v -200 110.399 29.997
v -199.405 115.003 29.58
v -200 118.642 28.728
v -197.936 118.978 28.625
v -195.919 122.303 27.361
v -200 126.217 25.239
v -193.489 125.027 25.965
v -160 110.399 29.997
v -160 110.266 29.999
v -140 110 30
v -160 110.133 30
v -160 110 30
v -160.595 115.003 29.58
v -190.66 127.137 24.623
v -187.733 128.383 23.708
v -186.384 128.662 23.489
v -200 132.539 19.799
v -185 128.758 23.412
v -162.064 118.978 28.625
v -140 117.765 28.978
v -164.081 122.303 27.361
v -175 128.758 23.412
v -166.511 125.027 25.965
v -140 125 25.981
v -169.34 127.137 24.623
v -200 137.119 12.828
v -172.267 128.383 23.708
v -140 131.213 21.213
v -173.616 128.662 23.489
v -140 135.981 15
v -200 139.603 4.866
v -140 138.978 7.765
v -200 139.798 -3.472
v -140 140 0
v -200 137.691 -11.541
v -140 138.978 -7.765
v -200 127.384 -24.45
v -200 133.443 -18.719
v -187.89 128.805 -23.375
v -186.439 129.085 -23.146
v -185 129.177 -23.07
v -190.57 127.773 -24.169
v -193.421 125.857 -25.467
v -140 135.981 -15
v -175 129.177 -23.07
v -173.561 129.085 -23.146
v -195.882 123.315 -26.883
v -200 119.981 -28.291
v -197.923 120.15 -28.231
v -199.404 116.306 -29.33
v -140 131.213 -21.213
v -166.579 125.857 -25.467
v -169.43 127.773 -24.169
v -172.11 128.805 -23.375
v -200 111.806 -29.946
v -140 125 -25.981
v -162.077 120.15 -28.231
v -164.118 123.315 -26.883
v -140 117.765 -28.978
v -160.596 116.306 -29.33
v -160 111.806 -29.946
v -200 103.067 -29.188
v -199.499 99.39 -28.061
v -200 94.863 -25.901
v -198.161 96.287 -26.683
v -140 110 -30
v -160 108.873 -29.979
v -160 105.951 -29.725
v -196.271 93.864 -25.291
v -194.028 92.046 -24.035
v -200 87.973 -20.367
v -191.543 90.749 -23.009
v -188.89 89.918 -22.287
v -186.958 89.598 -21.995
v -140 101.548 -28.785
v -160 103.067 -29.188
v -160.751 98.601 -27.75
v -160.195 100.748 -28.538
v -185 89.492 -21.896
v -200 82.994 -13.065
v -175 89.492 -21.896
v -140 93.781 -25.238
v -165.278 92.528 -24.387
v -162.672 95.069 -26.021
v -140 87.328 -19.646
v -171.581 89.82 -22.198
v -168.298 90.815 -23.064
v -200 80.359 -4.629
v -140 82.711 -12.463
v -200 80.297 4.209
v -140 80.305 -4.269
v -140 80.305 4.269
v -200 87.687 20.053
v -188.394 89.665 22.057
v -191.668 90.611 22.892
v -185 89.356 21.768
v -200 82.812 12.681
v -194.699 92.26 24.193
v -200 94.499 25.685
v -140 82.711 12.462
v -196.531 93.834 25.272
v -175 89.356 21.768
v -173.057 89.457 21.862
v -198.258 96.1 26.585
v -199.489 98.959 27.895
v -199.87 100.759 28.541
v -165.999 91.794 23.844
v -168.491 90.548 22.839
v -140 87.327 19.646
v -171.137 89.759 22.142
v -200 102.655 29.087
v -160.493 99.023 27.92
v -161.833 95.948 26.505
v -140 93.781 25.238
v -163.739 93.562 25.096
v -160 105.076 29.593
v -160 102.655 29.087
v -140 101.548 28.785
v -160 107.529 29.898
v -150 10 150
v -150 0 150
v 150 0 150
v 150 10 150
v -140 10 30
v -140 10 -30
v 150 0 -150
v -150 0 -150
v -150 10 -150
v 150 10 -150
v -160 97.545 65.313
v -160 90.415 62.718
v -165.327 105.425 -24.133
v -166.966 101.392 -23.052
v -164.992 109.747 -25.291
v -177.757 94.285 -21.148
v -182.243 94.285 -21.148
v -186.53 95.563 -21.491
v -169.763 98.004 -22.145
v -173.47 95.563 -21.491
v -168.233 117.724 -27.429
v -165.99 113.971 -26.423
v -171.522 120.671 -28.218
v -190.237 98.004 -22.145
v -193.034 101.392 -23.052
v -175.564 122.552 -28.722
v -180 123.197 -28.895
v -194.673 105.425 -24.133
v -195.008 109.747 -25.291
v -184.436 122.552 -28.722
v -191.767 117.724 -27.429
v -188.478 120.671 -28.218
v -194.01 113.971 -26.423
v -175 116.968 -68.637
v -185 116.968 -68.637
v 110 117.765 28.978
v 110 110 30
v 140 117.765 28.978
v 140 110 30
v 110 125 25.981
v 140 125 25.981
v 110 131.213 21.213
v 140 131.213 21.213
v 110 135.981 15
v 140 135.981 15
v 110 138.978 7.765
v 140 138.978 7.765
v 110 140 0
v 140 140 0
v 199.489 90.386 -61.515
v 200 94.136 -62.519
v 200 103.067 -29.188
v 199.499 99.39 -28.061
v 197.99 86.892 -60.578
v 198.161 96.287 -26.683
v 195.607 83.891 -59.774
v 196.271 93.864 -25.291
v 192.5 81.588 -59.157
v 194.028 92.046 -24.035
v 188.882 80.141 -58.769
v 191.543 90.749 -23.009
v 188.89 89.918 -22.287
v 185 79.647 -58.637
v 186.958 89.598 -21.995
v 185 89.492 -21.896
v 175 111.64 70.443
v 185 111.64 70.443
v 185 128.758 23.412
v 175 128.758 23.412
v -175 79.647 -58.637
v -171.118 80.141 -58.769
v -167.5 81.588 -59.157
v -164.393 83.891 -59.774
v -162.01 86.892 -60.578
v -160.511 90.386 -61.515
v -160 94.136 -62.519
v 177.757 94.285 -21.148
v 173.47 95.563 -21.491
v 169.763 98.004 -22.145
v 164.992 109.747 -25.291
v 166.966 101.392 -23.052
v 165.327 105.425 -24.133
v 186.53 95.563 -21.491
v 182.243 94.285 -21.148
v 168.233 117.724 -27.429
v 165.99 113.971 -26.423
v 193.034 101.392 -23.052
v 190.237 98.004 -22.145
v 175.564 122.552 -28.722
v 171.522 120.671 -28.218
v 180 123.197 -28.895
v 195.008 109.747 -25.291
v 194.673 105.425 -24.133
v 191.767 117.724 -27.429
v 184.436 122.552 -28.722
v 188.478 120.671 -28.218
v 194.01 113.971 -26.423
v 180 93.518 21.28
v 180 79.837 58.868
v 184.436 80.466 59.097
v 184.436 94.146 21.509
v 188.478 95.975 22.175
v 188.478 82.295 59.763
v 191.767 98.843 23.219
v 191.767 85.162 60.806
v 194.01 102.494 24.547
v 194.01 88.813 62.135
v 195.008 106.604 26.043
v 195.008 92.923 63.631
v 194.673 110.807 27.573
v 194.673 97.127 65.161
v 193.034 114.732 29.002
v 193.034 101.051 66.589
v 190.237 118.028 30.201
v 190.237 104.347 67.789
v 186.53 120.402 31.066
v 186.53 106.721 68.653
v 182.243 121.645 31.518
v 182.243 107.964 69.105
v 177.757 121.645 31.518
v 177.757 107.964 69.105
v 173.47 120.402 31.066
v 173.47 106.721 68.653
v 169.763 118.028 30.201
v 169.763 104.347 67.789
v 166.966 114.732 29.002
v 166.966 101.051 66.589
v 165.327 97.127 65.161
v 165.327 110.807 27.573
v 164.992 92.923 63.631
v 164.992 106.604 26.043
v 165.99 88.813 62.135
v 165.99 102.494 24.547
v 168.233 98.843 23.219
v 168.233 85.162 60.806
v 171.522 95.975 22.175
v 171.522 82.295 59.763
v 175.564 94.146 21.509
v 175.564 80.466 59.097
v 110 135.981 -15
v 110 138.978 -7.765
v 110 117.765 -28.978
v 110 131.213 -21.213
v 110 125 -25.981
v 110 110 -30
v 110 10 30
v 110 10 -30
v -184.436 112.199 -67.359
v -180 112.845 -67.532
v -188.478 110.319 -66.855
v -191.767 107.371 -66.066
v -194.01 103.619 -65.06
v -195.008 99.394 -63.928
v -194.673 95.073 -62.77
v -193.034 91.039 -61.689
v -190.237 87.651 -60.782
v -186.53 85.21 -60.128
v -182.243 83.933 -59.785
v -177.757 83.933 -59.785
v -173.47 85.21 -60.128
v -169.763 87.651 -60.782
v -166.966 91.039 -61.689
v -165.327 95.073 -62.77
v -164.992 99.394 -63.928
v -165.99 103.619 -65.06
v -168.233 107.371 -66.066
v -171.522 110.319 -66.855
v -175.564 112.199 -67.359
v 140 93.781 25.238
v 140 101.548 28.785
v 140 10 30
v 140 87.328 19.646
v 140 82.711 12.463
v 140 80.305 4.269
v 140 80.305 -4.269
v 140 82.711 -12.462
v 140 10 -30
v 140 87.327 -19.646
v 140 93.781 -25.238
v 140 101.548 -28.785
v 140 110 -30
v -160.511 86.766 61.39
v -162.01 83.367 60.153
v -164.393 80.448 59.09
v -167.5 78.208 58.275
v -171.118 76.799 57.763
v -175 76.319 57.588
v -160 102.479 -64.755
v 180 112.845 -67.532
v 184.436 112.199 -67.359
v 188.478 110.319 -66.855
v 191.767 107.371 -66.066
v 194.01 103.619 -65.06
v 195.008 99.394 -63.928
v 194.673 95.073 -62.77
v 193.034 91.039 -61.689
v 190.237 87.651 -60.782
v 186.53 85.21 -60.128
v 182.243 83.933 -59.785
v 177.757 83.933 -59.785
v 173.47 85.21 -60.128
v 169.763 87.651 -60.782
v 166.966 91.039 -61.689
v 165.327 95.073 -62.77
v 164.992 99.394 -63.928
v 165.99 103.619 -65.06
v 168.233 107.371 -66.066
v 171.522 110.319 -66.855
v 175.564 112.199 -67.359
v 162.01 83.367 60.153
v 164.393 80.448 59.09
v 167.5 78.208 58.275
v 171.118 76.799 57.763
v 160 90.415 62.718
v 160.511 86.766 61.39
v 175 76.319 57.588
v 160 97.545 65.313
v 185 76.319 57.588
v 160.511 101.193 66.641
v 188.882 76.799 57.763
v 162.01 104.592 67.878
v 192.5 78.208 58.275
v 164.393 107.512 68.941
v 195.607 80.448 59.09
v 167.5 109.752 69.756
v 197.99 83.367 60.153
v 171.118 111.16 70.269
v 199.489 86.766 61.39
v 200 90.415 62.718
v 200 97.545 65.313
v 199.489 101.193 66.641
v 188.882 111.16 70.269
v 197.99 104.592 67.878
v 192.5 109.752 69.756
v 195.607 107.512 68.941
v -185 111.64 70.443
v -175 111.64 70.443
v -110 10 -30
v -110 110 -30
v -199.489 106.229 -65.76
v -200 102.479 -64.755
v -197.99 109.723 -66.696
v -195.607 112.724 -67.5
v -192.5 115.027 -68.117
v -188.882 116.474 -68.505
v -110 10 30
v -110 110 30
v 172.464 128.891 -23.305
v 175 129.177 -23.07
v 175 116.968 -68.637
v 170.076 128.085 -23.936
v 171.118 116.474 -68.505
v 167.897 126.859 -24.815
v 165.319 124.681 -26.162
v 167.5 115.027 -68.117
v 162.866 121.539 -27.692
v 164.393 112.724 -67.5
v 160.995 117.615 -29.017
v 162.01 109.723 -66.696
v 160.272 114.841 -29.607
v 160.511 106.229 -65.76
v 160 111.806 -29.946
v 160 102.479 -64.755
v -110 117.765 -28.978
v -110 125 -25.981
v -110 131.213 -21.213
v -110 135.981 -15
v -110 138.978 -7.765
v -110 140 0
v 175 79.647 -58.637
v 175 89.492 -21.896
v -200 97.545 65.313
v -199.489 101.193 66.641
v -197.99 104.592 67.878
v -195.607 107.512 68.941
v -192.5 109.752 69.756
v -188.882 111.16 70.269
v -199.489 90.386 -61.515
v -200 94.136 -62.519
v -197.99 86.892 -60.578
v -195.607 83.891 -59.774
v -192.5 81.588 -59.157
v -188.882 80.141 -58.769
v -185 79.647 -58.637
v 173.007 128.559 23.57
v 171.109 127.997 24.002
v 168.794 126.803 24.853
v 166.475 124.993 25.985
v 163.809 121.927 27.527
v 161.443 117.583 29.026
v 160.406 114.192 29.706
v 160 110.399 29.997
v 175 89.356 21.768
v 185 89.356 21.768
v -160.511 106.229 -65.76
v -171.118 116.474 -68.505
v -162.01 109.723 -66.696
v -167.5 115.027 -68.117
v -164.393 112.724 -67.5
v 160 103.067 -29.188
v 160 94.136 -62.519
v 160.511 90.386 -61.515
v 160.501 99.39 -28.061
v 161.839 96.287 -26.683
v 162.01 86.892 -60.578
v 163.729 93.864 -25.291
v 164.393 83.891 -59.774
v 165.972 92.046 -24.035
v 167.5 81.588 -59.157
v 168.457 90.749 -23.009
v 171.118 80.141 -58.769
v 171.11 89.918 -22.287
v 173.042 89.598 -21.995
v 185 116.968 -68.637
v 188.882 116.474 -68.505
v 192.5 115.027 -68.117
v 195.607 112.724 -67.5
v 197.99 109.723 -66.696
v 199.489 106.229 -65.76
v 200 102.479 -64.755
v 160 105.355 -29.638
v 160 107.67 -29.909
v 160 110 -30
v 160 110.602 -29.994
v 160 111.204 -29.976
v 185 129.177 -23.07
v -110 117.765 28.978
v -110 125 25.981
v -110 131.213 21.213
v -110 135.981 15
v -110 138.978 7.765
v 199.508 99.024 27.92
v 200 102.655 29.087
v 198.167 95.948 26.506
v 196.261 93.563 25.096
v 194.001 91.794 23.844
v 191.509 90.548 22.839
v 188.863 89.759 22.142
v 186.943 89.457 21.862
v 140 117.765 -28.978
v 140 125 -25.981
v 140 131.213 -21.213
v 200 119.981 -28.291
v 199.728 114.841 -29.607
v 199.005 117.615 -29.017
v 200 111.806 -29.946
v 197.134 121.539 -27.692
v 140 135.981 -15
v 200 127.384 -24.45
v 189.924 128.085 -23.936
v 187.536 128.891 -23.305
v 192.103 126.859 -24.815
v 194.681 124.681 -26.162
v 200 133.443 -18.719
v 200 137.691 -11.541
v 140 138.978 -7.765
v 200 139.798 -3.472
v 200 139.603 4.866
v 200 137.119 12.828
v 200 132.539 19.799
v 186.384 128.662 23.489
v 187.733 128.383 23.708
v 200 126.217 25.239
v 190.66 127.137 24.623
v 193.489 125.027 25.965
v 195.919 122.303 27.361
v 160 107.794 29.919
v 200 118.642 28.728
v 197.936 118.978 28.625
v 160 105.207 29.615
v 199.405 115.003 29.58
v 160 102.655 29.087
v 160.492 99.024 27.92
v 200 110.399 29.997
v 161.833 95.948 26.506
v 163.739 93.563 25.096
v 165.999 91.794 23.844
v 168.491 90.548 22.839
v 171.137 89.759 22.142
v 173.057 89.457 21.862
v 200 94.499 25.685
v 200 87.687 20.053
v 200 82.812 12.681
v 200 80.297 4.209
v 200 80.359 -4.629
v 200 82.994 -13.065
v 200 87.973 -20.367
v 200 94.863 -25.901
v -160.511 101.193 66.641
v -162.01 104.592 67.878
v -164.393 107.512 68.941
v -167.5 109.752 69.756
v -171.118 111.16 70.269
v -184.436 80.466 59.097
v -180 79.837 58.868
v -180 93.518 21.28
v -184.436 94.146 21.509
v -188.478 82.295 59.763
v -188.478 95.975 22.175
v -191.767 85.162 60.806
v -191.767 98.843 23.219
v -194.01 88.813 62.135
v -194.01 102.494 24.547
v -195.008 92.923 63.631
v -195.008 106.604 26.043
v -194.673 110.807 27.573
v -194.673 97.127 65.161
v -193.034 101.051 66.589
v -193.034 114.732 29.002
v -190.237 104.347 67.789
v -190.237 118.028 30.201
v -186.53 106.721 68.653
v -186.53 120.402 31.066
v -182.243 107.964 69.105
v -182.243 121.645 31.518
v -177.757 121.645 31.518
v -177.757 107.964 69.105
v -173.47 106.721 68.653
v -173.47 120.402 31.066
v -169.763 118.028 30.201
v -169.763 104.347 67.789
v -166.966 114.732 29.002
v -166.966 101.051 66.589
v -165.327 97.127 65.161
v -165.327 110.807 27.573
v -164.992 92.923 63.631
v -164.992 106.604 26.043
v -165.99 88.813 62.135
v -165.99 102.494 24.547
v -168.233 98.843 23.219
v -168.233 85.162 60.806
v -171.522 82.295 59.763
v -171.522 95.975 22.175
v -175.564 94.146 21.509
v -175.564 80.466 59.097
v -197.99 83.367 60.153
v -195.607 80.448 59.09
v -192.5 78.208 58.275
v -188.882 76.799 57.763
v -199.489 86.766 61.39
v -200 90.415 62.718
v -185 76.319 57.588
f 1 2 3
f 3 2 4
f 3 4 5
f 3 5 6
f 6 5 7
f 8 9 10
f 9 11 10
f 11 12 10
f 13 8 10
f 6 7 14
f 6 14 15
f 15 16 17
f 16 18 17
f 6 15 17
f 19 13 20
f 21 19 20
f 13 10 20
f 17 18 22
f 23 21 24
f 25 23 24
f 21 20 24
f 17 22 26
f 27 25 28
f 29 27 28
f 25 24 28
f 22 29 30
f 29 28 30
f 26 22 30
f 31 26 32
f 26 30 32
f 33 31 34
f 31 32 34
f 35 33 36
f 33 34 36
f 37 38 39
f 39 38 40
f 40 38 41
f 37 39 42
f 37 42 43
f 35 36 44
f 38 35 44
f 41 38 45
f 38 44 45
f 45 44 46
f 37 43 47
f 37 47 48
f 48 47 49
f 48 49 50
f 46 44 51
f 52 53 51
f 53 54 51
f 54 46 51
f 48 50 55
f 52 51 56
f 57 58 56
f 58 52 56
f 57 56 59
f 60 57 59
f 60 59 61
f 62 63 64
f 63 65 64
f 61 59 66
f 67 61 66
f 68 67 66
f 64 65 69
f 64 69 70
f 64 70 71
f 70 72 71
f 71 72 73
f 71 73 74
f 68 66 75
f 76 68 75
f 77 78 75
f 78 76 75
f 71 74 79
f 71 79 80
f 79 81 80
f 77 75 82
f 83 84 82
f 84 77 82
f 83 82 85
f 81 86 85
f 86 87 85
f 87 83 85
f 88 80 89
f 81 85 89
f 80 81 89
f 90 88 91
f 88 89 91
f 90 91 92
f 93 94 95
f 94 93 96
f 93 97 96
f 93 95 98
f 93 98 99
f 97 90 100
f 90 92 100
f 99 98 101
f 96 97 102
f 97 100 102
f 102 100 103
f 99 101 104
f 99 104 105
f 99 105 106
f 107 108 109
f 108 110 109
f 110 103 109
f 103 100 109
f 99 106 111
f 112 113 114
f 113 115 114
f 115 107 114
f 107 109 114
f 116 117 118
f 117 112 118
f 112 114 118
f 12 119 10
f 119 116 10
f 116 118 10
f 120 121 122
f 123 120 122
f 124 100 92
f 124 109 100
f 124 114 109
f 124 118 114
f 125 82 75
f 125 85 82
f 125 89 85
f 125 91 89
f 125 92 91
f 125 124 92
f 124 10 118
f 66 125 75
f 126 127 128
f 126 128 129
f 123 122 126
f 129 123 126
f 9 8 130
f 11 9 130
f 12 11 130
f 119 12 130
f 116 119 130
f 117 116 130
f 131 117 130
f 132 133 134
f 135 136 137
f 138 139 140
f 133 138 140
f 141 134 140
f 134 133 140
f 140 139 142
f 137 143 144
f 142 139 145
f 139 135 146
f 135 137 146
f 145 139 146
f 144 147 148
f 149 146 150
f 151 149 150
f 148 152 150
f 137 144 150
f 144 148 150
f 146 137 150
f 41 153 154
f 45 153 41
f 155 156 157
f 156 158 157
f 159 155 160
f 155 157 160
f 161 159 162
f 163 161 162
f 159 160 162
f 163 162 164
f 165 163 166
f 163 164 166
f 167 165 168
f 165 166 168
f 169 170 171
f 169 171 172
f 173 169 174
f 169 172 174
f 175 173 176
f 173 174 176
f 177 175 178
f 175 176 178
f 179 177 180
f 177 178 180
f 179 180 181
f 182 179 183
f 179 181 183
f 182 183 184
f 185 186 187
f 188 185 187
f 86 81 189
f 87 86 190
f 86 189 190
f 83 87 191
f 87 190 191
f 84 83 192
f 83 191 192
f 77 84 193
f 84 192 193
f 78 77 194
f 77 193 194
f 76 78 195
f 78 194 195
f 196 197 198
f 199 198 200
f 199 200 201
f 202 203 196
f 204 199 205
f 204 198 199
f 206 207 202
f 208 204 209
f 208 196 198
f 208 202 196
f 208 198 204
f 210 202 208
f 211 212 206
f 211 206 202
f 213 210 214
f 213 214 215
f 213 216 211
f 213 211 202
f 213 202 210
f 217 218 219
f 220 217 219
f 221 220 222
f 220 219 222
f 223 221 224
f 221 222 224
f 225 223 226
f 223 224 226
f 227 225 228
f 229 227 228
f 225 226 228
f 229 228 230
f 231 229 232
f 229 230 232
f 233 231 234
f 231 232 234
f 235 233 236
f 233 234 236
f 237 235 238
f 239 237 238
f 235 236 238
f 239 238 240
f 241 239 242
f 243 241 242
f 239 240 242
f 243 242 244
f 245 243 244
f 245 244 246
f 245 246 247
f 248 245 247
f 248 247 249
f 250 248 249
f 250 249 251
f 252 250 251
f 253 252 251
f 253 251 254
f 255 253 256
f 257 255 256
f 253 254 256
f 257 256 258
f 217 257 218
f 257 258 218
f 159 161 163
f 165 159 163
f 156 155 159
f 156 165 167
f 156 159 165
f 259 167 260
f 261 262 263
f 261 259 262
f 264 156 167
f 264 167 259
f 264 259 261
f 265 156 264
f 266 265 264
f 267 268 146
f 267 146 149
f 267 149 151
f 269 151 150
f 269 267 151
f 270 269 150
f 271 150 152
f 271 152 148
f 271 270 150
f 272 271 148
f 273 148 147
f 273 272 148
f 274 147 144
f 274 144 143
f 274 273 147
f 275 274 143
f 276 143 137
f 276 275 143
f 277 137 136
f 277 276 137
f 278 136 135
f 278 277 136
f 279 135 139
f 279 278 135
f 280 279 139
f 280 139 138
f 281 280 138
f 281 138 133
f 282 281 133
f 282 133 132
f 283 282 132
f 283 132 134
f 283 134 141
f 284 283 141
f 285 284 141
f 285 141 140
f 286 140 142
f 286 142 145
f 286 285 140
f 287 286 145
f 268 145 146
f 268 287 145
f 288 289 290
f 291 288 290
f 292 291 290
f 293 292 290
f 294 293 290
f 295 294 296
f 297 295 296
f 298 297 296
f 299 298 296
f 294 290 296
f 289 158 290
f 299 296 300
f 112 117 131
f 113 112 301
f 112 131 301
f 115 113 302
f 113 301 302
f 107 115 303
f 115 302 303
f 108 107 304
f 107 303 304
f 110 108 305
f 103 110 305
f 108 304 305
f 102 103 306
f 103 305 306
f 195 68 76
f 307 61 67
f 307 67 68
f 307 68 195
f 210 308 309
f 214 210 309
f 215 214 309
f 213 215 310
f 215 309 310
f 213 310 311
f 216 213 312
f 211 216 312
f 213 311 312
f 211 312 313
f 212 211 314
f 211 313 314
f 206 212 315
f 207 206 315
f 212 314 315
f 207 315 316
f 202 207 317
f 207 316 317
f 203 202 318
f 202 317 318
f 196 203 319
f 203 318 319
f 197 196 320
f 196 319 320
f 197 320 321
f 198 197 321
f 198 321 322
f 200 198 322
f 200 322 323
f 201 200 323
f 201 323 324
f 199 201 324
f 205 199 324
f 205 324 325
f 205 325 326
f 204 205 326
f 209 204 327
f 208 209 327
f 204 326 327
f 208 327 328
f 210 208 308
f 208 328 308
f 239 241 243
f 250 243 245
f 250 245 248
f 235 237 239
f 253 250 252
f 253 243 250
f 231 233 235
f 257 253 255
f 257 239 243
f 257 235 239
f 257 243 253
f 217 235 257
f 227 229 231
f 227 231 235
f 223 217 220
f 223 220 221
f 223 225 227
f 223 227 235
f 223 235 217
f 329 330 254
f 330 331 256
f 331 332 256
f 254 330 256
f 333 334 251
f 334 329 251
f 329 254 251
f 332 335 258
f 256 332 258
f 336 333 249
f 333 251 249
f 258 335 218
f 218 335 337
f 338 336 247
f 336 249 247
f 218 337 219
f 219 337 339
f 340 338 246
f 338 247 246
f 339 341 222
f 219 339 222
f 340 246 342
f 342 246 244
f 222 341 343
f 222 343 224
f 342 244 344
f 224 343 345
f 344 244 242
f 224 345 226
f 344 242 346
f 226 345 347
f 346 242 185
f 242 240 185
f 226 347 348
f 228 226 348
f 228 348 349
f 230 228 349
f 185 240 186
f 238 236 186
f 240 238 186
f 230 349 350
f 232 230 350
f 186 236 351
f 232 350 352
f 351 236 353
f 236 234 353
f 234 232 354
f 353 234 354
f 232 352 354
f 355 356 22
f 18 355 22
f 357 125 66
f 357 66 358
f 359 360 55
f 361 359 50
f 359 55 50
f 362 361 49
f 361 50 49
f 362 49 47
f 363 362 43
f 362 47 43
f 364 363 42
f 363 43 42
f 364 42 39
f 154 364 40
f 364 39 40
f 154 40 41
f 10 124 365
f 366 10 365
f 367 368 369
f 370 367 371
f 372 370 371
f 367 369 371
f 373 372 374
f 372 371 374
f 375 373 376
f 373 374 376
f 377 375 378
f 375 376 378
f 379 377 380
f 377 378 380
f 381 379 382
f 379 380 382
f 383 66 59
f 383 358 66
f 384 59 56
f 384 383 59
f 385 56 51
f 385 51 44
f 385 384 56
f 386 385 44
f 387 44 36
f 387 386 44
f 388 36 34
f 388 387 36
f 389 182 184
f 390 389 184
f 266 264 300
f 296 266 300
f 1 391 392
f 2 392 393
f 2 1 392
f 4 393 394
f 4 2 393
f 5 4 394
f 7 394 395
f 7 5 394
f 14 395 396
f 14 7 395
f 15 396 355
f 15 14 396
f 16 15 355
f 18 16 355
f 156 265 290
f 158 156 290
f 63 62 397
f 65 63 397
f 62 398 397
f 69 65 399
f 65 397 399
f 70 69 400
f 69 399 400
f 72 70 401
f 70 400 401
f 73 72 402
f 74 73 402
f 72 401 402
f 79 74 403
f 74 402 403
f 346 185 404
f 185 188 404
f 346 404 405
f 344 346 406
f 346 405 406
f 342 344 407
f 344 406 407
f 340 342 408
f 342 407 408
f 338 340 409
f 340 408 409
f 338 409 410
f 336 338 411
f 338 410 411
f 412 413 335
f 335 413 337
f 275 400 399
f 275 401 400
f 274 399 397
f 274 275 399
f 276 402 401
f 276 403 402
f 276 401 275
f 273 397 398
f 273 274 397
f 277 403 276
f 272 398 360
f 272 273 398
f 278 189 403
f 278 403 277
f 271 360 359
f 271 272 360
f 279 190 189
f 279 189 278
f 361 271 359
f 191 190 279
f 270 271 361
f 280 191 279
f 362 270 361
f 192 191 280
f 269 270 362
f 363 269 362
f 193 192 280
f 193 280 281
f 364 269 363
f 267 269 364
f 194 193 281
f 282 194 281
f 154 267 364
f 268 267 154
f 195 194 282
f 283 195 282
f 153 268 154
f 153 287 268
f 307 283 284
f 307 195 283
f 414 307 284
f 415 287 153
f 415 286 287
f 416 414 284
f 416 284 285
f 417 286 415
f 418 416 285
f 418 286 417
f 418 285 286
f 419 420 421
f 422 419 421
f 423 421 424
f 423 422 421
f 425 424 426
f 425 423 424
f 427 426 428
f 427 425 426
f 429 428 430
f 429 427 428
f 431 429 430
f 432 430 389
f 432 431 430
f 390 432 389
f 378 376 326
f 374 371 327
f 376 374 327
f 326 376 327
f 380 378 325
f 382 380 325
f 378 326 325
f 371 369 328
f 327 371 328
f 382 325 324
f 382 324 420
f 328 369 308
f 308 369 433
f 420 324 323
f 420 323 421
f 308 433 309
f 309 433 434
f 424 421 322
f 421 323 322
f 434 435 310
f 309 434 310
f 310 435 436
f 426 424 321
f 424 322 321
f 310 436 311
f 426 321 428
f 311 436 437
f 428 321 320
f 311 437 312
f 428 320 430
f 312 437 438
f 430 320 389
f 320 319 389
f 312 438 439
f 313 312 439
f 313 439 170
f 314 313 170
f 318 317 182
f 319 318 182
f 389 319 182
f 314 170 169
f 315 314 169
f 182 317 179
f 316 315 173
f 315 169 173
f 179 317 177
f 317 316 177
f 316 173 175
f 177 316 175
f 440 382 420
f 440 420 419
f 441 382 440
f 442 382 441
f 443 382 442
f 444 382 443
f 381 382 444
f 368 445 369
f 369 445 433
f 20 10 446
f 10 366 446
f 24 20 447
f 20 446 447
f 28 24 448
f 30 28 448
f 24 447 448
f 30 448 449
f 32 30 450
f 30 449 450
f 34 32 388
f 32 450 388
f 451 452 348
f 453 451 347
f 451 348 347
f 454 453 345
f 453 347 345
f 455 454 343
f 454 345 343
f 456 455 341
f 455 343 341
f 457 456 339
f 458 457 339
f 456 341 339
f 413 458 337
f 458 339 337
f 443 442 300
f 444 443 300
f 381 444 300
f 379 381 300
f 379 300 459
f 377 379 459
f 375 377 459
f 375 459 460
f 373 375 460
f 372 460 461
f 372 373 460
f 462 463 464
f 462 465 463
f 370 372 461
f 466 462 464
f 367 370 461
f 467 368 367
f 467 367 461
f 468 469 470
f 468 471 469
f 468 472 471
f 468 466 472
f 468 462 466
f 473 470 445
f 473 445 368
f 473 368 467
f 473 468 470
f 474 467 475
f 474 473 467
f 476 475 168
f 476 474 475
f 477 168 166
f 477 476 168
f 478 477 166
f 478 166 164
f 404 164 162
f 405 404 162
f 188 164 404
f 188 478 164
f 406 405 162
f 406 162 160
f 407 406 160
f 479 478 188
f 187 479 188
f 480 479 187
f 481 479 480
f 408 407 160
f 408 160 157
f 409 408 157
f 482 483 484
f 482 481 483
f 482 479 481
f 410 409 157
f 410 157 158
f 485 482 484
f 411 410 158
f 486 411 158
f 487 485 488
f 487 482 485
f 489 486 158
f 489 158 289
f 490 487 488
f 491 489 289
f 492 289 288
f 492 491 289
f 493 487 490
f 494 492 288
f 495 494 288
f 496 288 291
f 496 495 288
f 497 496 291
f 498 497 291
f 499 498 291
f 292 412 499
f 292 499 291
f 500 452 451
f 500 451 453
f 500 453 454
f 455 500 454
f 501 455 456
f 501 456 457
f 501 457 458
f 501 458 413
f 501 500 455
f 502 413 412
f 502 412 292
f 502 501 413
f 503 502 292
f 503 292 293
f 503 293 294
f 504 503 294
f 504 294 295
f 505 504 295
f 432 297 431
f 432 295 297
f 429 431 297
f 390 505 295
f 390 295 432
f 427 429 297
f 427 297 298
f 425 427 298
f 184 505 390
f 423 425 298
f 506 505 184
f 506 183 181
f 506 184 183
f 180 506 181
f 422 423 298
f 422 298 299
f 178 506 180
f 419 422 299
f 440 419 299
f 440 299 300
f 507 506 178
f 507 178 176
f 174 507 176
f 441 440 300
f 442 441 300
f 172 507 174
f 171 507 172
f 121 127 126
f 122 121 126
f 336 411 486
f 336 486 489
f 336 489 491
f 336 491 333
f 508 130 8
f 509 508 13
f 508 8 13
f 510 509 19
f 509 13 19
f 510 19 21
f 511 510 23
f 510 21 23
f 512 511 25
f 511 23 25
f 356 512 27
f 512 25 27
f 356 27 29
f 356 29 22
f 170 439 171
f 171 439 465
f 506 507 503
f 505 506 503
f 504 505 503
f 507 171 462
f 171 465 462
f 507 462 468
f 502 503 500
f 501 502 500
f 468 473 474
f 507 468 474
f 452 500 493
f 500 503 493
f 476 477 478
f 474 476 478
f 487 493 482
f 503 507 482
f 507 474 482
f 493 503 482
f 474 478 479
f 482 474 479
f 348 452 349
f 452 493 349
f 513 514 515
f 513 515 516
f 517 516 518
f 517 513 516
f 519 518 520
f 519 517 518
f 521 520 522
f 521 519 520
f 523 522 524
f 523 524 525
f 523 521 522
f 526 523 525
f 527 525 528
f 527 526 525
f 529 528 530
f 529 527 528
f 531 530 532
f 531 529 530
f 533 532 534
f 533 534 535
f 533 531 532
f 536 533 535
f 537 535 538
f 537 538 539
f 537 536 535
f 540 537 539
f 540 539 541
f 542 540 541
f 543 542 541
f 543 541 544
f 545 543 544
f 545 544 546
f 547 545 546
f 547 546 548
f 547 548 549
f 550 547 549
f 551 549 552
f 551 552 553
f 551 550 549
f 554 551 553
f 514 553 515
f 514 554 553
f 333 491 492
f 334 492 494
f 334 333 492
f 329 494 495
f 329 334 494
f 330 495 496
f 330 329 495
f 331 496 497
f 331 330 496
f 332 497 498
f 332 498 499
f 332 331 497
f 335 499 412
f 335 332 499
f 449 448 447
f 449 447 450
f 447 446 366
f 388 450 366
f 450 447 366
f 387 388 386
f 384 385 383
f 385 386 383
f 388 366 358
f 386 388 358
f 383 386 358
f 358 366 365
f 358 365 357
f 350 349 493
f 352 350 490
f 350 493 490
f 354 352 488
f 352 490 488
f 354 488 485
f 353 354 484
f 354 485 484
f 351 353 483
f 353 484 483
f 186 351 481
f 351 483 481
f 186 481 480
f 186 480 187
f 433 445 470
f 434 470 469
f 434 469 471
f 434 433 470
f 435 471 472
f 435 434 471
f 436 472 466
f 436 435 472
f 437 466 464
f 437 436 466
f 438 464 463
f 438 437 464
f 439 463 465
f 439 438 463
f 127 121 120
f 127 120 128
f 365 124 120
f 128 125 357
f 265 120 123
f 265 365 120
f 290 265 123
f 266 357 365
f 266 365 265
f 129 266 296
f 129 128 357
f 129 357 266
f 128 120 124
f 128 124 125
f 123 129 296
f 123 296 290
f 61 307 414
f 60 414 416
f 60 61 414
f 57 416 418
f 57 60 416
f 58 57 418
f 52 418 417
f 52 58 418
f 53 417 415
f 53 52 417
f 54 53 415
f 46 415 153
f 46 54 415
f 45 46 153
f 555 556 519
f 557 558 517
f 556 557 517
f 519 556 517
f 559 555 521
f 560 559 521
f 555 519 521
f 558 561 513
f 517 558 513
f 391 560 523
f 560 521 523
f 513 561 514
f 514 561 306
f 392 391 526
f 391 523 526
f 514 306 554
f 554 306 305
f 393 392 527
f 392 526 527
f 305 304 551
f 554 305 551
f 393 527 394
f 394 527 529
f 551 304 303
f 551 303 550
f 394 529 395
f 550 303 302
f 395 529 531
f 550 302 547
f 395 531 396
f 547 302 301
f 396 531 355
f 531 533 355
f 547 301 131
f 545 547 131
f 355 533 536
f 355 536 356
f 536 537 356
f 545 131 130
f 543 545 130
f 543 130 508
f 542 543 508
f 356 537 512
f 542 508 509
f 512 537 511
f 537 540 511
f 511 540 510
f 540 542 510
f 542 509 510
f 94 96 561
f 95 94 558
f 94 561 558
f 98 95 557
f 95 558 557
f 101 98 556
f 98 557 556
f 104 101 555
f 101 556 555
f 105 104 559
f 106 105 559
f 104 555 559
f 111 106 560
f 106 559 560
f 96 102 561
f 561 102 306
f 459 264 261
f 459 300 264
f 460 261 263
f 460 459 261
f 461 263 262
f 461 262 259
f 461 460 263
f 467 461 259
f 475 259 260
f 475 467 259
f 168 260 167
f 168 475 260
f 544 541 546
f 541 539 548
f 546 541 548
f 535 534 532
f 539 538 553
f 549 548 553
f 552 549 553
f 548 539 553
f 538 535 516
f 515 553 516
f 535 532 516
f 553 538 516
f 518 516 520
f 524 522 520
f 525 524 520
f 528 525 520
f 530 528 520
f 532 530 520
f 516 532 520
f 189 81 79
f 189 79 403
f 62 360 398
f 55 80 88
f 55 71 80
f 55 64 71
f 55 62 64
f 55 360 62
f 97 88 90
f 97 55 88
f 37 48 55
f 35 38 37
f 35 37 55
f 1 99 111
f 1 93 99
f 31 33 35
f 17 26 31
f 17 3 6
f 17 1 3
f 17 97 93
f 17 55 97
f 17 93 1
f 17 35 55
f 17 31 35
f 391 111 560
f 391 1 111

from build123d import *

# Parameters (mm, degrees)
SKETCH2_W           = 300
SKETCH2_H           = 300
BOSS_EXTRUDE1_DEPTH = 10
SKETCH3_W           = 30
SKETCH3_H           = 60
BOSS_EXTRUDE2_DEPTH = 130
FILLET1_R           = 30
SKETCH4_R           = 30
BOSS_EXTRUDE4_DEPTH = 60
BOSS_EXTRUDE5_START = 60
SKETCH5_R           = 30
BOSS_EXTRUDE5_DEPTH = 60
BOSS_EXTRUDE6_START = -40
BOSS_EXTRUDE6_DEPTH = 40
BOSS_EXTRUDE7_DEPTH = 40
SKETCH8_R           = 15.05
CUT_EXTRUDE1_DEPTH  = 40
SKETCH9_R           = 15.05
CUT_EXTRUDE2_DEPTH  = 40
FILLET2_R           = 15


with BuildPart() as part:
    # Sketch2 → Boss-Extrude1 (new body)
    with BuildSketch(Plane(origin=(0, 0, 0), x_dir=(1, 0, 0), z_dir=(0, 1, 0))):
        Rectangle(SKETCH2_W, SKETCH2_H)
    extrude(amount=BOSS_EXTRUDE1_DEPTH)

    # Sketch3 → Boss-Extrude2 (add)
    with BuildSketch(Plane(origin=(0, 10, 0), x_dir=(1, 0, 0), z_dir=(0, 1, 0))):
        with Locations((-125, 0)):
            Rectangle(SKETCH3_W, SKETCH3_H)
        with Locations((125, 0)):
            Rectangle(SKETCH3_W, SKETCH3_H)
    extrude(amount=BOSS_EXTRUDE2_DEPTH)

    # Fillet1
    fillet1_edges = [part.edges().sort_by_distance(p)[0] for p in [
        (125, 140, -30),
        (125, 140, 30),
        (-125, 140, 30),
        (-125, 140, -30),
    ]]
    fillet(fillet1_edges, radius=FILLET1_R - 0.0001)  # a hair under: the kernel refuses the full size

    # Sketch4 → Boss-Extrude4 (add)
    with BuildSketch(Plane.ZY.offset(140)):
        with Locations((0, 110)):
            Circle(SKETCH4_R)
    extrude(amount=BOSS_EXTRUDE4_DEPTH)

    # Sketch5 → Boss-Extrude5 (add)
    with BuildSketch(Plane(origin=(140, 0, 0), x_dir=(0, 0, -1), z_dir=(1, 0, 0)).offset(BOSS_EXTRUDE5_START)):
        with Locations((0, 110)):
            Circle(SKETCH5_R)
    extrude(amount=-BOSS_EXTRUDE5_DEPTH)

    # Sketch6 → Boss-Extrude6 (add)
    with BuildSketch(Plane.ZY.offset(200).offset(BOSS_EXTRUDE6_START)):
        with BuildLine():
            Line((-21.895741175, 89.492037683), (-58.637033052, 79.647238196))
            Line((-58.637033052, 79.647238196), (-68.637033052, 116.967746272))
            Line((-68.637033052, 116.967746272), (-23.070072037, 129.177376677))
            ThreePointArc((-23.070072037, 129.177376677), (-29.986874166, 109.112656899), (-21.895741175, 89.492037683))
        make_face()
        with BuildLine():
            Line((21.768001871, 89.356499945), (57.587704831, 76.319194267))
            Line((57.587704831, 76.319194267), (70.443457025, 111.640083129))
            Line((70.443457025, 111.640083129), (23.412322022, 128.758016354))
            ThreePointArc((23.412322022, 128.758016354), (29.973910166, 108.749116558), (21.768001871, 89.356499945))
        make_face()
    extrude(amount=BOSS_EXTRUDE6_DEPTH)

    # Sketch7 → Boss-Extrude7 (add)
    with BuildSketch(Plane(origin=(200, 0, 0), x_dir=(0, 0, -1), z_dir=(1, 0, 0))):
        with BuildLine():
            Line((-21.768001871, 89.356499945), (-57.587704831, 76.319194267))
            Line((-57.587704831, 76.319194267), (-70.443457025, 111.640083129))
            Line((-70.443457025, 111.640083129), (-23.412322022, 128.758016354))
            ThreePointArc((-23.412322022, 128.758016354), (-29.973910166, 108.749116558), (-21.768001871, 89.356499945))
        make_face()
        with BuildLine():
            Line((23.070072037, 129.177376677), (68.637033052, 116.967746272))
            Line((68.637033052, 116.967746272), (58.637033052, 79.647238196))
            Line((58.637033052, 79.647238196), (21.895741175, 89.492037683))
            ThreePointArc((21.895741175, 89.492037683), (29.986874166, 109.112656899), (23.070072037, 129.177376677))
        make_face()
    extrude(amount=-BOSS_EXTRUDE7_DEPTH)

    # Sketch8 → Cut-Extrude1 (cut)
    with BuildSketch(Plane(origin=(0, -9.323904974, -34.797287089), x_dir=(-1, 0, 0), z_dir=(0, -0.2588190451025219, -0.965925826289068))):
        with Locations(Location((-180, 111.428221794, 0), (0, 0, 90))):
            Circle(SKETCH8_R)
    cut_extrude1 = extrude(amount=-CUT_EXTRUDE1_DEPTH, mode=Mode.SUBTRACT)

    # Mirror1: Cut-Extrude1 across plane
    add(cut_extrude1.mirror(Plane(origin=(0, 0, 0), x_dir=(0, 0, 1), z_dir=(1, 0, 0))), mode=Mode.SUBTRACT)

    # Sketch9 → Cut-Extrude2 (cut)
    with BuildSketch(Plane(origin=(0, -9.58068177, 26.322706827), x_dir=(1, 0, 0), z_dir=(0, -0.3420201433256628, 0.9396926207859106))):
        with Locations(Location((180, 110.206591153, 0), (0, 0, 270))):
            Circle(SKETCH9_R)
    cut_extrude2 = extrude(amount=-CUT_EXTRUDE2_DEPTH, mode=Mode.SUBTRACT)

    # Mirror2: Cut-Extrude2 across plane
    add(cut_extrude2.mirror(Plane(origin=(0, 0, 0), x_dir=(0, 0, 1), z_dir=(1, 0, 0))), mode=Mode.SUBTRACT)

    # Fillet2
    fillet2_edges = [part.edges().sort_by_distance(p)[0] for p in [
        (160, 120.199049742, 46.927889523),
        (160, 82.837847106, 39.677853351),
        (200, 120.199049742, 46.927889523),
        (200, 82.837847106, 39.677853351),
        (160, 84.569637939, -40.266387113),
        (160, 123.072561474, -45.853552544),
        (200, 123.072561474, -45.853552544),
        (200, 84.569637939, -40.266387113),
        (-160, 123.072561474, -45.853552544),
        (-160, 84.569637939, -40.266387113),
        (-200, 84.569637939, -40.266387113),
        (-200, 123.072561474, -45.853552544),
        (-160, 82.837847106, 39.677853351),
        (-160, 120.199049742, 46.927889523),
        (-200, 120.199049742, 46.927889523),
        (-200, 82.837847106, 39.677853351),
    ]]
    fillet(fillet2_edges, radius=FILLET2_R)


solid = part.part
